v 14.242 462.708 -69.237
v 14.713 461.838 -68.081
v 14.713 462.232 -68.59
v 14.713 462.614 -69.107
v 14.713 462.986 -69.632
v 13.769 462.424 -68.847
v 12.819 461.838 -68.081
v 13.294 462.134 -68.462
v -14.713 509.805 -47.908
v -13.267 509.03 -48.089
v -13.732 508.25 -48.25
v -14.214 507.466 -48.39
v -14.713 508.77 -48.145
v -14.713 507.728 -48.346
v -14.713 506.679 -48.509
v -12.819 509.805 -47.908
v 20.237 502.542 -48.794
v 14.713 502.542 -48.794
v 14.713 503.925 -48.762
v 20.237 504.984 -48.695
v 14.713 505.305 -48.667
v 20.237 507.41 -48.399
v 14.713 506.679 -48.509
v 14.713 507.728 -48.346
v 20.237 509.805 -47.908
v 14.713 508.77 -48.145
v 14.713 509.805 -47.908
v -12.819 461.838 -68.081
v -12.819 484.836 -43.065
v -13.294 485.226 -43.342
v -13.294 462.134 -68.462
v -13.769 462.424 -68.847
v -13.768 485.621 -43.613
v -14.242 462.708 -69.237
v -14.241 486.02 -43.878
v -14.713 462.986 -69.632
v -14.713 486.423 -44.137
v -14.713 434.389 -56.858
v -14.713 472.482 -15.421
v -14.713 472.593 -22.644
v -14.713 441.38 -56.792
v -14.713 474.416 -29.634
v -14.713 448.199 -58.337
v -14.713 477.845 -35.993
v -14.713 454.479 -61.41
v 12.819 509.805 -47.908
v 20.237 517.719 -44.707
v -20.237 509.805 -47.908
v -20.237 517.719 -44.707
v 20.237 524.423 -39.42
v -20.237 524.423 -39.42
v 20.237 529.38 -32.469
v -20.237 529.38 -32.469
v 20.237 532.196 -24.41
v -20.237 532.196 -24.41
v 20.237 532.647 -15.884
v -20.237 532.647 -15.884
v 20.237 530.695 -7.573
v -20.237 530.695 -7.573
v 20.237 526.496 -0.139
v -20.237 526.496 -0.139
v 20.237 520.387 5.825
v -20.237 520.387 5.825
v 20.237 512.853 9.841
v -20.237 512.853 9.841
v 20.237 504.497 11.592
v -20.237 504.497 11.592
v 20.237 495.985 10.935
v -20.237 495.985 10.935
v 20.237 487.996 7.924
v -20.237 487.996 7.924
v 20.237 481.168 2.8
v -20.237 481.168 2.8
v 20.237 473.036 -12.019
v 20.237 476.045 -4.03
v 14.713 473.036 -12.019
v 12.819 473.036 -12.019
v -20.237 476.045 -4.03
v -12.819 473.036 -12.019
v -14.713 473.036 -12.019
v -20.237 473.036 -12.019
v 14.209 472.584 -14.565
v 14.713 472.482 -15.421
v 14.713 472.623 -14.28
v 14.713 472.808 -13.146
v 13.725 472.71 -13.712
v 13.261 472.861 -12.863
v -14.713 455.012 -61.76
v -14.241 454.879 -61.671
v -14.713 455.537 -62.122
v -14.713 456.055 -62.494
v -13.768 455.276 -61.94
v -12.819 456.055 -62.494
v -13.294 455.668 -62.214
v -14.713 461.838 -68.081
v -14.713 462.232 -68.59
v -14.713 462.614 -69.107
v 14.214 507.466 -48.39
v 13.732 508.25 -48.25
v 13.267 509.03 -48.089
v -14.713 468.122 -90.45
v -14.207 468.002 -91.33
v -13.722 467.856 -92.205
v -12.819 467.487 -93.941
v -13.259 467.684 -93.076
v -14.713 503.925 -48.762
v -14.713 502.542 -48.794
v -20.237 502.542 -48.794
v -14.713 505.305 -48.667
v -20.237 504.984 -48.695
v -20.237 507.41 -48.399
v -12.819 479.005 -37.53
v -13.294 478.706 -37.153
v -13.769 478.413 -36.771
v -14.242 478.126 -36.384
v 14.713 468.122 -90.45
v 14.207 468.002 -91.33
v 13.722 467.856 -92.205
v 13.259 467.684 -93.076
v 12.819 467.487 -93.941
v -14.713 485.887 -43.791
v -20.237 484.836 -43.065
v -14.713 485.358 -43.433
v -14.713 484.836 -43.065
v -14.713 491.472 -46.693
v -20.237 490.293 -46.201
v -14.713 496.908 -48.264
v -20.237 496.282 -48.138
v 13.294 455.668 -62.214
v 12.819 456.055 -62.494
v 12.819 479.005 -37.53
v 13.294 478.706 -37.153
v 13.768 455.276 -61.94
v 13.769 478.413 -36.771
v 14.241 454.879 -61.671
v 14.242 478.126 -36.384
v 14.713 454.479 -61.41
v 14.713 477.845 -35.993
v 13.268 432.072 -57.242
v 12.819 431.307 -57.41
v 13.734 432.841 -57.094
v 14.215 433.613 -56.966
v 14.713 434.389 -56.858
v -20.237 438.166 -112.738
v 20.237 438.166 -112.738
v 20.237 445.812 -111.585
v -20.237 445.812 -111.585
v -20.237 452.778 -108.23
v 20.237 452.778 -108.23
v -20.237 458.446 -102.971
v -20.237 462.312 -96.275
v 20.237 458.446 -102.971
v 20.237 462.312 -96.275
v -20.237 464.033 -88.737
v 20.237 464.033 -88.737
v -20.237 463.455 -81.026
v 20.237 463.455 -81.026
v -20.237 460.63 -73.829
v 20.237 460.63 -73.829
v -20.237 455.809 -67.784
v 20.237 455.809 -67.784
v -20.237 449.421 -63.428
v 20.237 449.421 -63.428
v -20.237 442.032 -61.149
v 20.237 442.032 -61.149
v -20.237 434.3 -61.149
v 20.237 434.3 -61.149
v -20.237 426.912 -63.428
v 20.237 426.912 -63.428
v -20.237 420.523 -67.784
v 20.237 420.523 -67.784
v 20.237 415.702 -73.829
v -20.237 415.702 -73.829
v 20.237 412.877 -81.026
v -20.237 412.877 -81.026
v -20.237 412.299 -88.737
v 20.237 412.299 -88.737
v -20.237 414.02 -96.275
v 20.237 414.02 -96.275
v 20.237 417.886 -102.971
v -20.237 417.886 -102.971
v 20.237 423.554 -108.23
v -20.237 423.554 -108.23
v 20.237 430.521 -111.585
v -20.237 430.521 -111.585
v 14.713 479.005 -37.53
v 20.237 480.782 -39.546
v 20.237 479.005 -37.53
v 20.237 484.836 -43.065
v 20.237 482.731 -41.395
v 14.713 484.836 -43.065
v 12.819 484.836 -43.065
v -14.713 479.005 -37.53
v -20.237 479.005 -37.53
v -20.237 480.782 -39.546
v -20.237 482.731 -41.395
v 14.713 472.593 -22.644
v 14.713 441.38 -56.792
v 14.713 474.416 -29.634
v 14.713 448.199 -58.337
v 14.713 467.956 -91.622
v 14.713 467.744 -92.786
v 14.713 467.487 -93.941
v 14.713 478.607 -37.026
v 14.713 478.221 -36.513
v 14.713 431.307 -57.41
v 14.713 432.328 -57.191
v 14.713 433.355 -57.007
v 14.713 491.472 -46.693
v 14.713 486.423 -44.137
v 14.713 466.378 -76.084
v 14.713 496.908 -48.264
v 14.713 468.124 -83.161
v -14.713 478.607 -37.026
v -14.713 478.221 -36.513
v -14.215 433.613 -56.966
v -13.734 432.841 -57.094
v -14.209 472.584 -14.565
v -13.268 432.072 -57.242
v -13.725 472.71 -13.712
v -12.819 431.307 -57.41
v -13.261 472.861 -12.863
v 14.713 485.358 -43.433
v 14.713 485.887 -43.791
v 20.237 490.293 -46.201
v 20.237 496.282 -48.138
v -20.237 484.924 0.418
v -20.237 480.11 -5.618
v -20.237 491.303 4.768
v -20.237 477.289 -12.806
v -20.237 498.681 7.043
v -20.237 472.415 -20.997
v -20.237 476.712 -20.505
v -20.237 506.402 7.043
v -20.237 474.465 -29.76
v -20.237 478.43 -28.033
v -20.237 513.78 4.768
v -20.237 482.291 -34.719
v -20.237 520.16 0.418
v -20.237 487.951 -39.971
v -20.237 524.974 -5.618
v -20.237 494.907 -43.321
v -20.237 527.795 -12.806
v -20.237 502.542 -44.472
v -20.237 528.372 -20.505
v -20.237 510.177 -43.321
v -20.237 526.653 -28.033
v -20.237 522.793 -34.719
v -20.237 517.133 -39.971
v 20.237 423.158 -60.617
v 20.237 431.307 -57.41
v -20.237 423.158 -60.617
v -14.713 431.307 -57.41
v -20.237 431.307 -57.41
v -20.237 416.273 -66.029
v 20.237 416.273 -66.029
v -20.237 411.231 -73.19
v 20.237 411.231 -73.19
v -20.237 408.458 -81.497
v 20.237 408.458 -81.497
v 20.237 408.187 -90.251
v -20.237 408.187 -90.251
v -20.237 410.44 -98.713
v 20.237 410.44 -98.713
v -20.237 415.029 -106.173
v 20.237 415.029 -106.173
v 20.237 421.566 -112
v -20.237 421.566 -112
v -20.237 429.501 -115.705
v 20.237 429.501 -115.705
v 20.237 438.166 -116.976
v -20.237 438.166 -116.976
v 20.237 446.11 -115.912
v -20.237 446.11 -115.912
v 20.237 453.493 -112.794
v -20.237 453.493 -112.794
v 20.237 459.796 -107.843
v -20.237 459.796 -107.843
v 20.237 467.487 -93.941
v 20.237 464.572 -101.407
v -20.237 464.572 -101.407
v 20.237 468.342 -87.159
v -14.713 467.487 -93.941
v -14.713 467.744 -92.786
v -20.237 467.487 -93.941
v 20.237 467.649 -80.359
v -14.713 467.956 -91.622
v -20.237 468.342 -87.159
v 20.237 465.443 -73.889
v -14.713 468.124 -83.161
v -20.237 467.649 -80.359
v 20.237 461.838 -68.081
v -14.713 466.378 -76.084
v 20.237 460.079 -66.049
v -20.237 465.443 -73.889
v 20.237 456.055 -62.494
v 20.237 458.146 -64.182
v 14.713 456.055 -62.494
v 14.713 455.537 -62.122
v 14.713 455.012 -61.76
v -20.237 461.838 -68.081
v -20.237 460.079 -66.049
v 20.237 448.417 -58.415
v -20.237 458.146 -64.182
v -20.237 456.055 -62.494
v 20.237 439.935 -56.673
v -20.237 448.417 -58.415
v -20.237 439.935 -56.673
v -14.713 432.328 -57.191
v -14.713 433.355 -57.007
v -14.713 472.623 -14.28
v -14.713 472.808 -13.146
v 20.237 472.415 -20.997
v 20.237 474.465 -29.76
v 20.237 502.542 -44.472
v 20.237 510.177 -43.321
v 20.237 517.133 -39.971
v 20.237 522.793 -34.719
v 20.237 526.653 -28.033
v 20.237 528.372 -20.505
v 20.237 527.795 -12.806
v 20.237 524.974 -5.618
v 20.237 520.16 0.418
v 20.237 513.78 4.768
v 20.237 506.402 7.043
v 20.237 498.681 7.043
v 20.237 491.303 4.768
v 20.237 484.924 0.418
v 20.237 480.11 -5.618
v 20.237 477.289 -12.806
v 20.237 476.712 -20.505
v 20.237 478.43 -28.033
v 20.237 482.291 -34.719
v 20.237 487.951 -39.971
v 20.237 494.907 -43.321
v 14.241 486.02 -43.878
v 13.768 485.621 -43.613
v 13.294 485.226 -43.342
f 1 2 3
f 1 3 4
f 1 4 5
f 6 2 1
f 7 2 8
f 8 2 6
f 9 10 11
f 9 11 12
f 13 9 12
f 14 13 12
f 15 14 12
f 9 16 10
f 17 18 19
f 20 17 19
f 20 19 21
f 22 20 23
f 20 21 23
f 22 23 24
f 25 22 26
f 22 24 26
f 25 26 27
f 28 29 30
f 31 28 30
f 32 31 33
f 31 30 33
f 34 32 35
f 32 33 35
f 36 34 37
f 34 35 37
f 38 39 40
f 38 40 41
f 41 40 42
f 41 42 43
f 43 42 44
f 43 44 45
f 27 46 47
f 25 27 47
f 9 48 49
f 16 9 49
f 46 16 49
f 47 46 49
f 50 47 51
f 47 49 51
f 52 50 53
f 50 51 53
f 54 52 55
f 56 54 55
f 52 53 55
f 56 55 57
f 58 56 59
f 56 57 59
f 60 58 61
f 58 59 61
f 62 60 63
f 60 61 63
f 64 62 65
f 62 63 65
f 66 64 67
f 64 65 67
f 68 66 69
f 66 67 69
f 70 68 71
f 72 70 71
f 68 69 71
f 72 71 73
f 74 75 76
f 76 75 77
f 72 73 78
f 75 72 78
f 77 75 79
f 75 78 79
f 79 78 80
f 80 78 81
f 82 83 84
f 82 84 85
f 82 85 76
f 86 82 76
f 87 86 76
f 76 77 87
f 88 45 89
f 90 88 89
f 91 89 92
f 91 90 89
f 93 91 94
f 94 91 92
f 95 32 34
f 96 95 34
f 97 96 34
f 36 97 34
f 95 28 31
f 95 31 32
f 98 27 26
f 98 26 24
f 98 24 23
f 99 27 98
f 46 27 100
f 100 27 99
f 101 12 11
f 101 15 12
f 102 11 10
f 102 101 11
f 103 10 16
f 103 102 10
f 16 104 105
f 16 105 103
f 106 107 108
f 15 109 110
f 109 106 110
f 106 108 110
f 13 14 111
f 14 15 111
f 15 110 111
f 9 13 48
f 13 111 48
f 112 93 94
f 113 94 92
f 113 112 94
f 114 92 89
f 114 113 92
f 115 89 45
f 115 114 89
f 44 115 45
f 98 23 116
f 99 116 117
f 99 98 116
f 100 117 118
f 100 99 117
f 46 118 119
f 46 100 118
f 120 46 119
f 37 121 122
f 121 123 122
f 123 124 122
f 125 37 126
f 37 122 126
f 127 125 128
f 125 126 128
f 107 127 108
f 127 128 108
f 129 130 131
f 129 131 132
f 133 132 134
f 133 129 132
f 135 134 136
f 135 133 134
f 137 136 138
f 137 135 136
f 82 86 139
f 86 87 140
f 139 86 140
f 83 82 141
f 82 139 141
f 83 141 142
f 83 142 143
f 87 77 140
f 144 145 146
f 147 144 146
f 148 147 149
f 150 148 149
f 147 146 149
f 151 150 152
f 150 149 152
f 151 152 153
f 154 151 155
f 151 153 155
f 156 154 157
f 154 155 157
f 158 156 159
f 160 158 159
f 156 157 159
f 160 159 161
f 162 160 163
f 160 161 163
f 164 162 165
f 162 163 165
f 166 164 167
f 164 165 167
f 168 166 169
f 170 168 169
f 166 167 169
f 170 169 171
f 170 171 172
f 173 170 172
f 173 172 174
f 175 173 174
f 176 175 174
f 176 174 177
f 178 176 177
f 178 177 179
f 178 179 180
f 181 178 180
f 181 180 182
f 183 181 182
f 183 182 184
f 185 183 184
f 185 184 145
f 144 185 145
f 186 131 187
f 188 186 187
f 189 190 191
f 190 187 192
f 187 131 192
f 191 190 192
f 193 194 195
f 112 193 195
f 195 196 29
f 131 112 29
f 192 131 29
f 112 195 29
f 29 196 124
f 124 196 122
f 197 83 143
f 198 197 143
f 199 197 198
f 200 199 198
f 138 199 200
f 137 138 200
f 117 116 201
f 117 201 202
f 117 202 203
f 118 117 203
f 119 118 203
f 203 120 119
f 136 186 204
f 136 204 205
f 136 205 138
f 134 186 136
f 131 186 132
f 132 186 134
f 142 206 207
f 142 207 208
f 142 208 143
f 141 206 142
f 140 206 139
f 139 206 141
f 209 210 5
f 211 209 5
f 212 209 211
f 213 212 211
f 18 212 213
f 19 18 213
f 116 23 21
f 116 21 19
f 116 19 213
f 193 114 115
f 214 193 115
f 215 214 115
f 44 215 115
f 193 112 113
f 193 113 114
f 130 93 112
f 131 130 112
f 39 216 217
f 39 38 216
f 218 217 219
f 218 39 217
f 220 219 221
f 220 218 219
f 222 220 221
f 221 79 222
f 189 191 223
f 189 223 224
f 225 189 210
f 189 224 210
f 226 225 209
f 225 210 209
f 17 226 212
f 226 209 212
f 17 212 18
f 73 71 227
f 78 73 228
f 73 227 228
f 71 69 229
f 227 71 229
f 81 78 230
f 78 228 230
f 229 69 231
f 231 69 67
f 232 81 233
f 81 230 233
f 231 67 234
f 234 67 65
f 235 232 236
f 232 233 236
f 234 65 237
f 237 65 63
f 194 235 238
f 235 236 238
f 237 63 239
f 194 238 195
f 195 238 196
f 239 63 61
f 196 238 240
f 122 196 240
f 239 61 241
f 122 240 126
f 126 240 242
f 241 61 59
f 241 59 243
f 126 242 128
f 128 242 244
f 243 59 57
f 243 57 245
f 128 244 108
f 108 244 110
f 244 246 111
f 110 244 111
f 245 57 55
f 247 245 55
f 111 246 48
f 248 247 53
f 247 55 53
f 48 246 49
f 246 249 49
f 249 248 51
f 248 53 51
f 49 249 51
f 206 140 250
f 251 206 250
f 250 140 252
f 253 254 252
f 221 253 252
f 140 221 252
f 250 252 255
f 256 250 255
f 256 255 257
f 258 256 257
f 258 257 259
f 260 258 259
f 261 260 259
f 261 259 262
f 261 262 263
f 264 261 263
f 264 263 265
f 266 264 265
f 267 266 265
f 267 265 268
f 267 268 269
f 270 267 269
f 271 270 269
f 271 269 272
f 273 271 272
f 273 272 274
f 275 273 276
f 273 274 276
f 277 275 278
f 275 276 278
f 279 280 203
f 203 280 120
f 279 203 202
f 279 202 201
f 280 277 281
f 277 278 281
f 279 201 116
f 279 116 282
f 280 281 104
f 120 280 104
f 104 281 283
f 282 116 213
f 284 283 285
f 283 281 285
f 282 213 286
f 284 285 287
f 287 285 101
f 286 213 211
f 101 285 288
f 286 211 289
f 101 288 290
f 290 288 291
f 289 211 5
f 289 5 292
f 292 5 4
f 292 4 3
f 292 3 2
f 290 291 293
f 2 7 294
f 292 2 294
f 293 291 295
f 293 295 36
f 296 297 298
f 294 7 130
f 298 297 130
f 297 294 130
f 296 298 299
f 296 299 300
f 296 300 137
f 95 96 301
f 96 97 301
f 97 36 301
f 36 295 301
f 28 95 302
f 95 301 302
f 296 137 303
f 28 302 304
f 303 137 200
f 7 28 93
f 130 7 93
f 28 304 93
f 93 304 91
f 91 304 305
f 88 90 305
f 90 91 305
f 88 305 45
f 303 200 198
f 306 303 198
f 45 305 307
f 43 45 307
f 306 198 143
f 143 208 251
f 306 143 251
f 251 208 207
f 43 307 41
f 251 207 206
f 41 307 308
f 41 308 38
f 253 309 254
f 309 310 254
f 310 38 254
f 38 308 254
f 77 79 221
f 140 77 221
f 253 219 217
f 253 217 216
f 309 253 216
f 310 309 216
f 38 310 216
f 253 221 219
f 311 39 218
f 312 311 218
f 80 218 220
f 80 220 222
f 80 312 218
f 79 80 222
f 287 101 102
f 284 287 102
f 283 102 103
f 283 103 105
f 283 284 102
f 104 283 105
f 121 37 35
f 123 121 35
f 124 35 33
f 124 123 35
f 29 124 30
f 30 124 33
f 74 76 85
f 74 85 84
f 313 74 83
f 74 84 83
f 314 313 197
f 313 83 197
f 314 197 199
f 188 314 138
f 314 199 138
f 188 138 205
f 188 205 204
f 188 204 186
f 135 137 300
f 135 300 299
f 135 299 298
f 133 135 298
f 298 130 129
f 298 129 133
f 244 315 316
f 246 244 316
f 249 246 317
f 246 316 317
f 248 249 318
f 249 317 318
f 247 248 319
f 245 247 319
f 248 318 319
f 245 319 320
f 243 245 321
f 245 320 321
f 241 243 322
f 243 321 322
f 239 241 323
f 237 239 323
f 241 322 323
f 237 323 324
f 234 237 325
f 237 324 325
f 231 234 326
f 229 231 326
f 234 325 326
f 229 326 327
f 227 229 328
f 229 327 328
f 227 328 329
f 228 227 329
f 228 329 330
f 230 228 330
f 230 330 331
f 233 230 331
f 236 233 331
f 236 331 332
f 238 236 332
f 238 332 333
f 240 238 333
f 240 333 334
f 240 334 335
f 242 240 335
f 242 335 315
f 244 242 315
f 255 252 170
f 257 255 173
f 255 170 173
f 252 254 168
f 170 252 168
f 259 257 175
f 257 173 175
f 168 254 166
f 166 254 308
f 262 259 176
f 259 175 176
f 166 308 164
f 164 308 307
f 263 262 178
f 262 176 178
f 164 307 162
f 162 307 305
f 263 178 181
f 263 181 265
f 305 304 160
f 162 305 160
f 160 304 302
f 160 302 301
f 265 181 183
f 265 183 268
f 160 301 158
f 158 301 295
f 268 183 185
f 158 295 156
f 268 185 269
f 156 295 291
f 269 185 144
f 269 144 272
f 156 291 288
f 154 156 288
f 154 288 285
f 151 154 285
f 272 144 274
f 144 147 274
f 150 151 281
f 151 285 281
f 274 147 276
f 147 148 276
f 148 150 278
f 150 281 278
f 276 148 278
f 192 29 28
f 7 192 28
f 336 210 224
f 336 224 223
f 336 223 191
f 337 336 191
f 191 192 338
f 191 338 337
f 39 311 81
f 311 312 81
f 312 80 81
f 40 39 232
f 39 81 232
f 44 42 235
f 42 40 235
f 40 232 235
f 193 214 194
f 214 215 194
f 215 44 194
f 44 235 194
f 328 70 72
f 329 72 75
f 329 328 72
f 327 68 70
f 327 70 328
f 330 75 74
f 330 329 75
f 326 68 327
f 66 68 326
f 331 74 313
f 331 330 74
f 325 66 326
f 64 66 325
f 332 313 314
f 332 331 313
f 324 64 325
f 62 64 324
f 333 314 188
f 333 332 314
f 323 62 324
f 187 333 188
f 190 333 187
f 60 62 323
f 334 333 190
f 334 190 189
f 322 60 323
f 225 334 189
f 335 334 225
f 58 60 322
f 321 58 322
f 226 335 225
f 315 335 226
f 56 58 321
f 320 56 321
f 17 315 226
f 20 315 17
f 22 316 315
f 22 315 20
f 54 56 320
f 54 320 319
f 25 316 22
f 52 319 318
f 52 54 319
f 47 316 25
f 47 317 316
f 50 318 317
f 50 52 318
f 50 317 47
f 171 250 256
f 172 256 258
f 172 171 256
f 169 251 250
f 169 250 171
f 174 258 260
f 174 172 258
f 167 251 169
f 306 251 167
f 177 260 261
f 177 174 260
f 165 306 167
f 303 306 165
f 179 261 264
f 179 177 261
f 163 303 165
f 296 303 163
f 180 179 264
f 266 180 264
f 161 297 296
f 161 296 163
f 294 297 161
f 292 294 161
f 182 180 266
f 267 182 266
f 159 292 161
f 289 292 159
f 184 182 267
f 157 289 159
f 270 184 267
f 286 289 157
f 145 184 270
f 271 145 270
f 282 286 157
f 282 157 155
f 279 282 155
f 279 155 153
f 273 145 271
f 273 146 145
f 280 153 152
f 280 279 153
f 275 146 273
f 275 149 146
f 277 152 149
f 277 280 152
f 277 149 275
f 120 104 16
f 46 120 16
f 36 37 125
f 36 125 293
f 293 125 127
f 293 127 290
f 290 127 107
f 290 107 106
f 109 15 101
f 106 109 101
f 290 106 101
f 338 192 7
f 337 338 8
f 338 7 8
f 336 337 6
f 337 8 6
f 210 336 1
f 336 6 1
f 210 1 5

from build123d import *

# Parameters (mm, degrees)
BOSS_EXTRUDE2_DEPTH      = 14.713204
BOSS_EXTRUDE2_DEPTH_BACK = 14.713204
BOSS_EXTRUDE3_DEPTH      = 20.236561
BOSS_EXTRUDE3_DEPTH_BACK = 20.236561
SKETCH2_R                = 25.902158
SKETCH2_R_2              = 25.939329669
CUT_EXTRUDE1_DEPTH       = 547.956280292
CHAMFER1_SIZE            = 1.894586


with BuildPart() as part:
    # Sketch1 → Boss-Extrude2 (new, two sides: drawn at the far end of the back side and taken through both)
    with BuildSketch(Plane(origin=(0, 0, 0), x_dir=(0, 0, -1), z_dir=(1, 0, 0)).offset(-BOSS_EXTRUDE2_DEPTH_BACK)):
        with BuildLine():
            ThreePointArc((37.530301218, 479.004762545), (25.455145516, 473.112329842), (12.01921241, 473.035844862))
            Line((12.01921241, 473.035844862), (57.410437724, 431.307373701))
            ThreePointArc((57.410437724, 431.307373701), (57.237962601, 444.238910489), (62.494422204, 456.05517148))
            Line((62.494422204, 456.05517148), (37.530301218, 479.004762545))
        make_face()
        with BuildLine():
            Line((93.941121838, 467.486529022), (47.908047204, 509.804855969))
            ThreePointArc((47.908047204, 509.804855969), (48.571470239, 506.200224369), (48.793700581, 502.541794))
            ThreePointArc((48.793700581, 502.541794), (47.325762011, 493.23696216), (43.064536592, 484.835968341))
            Line((43.064536592, 484.835968341), (68.081105171, 461.838170852))
            ThreePointArc((68.081105171, 461.838170852), (80.358782988, 467.648930733), (93.941121838, 467.486529022))
        make_face()
        with BuildLine():
            Line((0.348742, 483.76459), (12.01921241, 473.035844862))
            ThreePointArc((12.01921241, 473.035844862), (25.455145516, 473.112329842), (37.530301218, 479.004762545))
            Line((37.530301218, 479.004762545), (15.677896, 499.093744))
            Line((15.677896, 499.093744), (0.348742, 483.76459))
        make_face()
        with BuildLine():
            Line((47.908047204, 509.804855969), (36.696142, 520.11199))
            Line((36.696142, 520.11199), (21.366988, 504.782582))
            Line((21.366988, 504.782582), (43.064536592, 484.835968341))
            ThreePointArc((43.064536592, 484.835968341), (47.325762011, 493.23696216), (48.793700581, 502.541794))
            ThreePointArc((48.793700581, 502.541794), (48.571470239, 506.200224369), (47.908047204, 509.804855969))
        make_face()
        with BuildLine():
            Line((21.366988, 504.782582), (36.696142, 520.11199))
            Line((36.696142, 520.11199), (47.908047204, 509.804855969))
            ThreePointArc((47.908047204, 509.804855969), (-3.059663869, 523.653132734), (12.01921241, 473.035844862))
            Line((12.01921241, 473.035844862), (0.348742, 483.76459))
            Line((0.348742, 483.76459), (15.677896, 499.093744))
            Line((15.677896, 499.093744), (37.530301218, 479.004762545))
            ThreePointArc((37.530301218, 479.004762545), (40.492163472, 481.735538786), (43.064536592, 484.835968341))
            Line((43.064536592, 484.835968341), (21.366988, 504.782582))
        make_face()
        with BuildLine():
            ThreePointArc((116.976157863, 438.166256), (110.528637975, 456.809561064), (93.941121838, 467.486529022))
            Line((93.941121838, 467.486529022), (94.929198, 466.578188))
            Line((94.929198, 466.578188), (79.600044, 451.24878))
            Line((79.600044, 451.24878), (68.081105171, 461.838170852))
            ThreePointArc((68.081105171, 461.838170852), (65.094293396, 459.13357369), (62.494422204, 456.05517148))
            Line((62.494422204, 456.05517148), (73.911206, 445.559688))
            Line((73.911206, 445.559688), (58.581798, 430.230534))
            Line((58.581798, 430.230534), (57.410437724, 431.307373701))
            ThreePointArc((57.410437724, 431.307373701), (90.250505926, 408.186599222), (116.976157863, 438.166256))
        make_face()
        with BuildLine():
            Line((94.929198, 466.578188), (93.941121838, 467.486529022))
            ThreePointArc((93.941121838, 467.486529022), (80.358782988, 467.648930733), (68.081105171, 461.838170852))
            Line((68.081105171, 461.838170852), (79.600044, 451.24878))
            Line((79.600044, 451.24878), (94.929198, 466.578188))
        make_face()
        with BuildLine():
            ThreePointArc((62.494422204, 456.05517148), (57.237962601, 444.238910489), (57.410437724, 431.307373701))
            Line((57.410437724, 431.307373701), (58.581798, 430.230534))
            Line((58.581798, 430.230534), (73.911206, 445.559688))
            Line((73.911206, 445.559688), (62.494422204, 456.05517148))
        make_face()
    extrude(amount=BOSS_EXTRUDE2_DEPTH + BOSS_EXTRUDE2_DEPTH_BACK)

    # Sketch1<3> → Boss-Extrude3 (add, two sides: drawn at the far end of the back side and taken through both)
    with BuildSketch(Plane(origin=(0, 0, 0), x_dir=(0, 0, -1), z_dir=(1, 0, 0)).offset(-BOSS_EXTRUDE3_DEPTH_BACK)):
        with BuildLine():
            Line((21.366988, 504.782582), (36.696142, 520.11199))
            Line((36.696142, 520.11199), (47.908047204, 509.804855969))
            ThreePointArc((47.908047204, 509.804855969), (-3.059663869, 523.653132734), (12.01921241, 473.035844862))
            Line((12.01921241, 473.035844862), (0.348742, 483.76459))
            Line((0.348742, 483.76459), (15.677896, 499.093744))
            Line((15.677896, 499.093744), (37.530301218, 479.004762545))
            ThreePointArc((37.530301218, 479.004762545), (40.492163472, 481.735538786), (43.064536592, 484.835968341))
            Line((43.064536592, 484.835968341), (21.366988, 504.782582))
        make_face()
        with BuildLine():
            ThreePointArc((116.976157863, 438.166256), (110.528637975, 456.809561064), (93.941121838, 467.486529022))
            Line((93.941121838, 467.486529022), (94.929198, 466.578188))
            Line((94.929198, 466.578188), (79.600044, 451.24878))
            Line((79.600044, 451.24878), (68.081105171, 461.838170852))
            ThreePointArc((68.081105171, 461.838170852), (65.094293396, 459.13357369), (62.494422204, 456.05517148))
            Line((62.494422204, 456.05517148), (73.911206, 445.559688))
            Line((73.911206, 445.559688), (58.581798, 430.230534))
            Line((58.581798, 430.230534), (57.410437724, 431.307373701))
            ThreePointArc((57.410437724, 431.307373701), (90.250505926, 408.186599222), (116.976157863, 438.166256))
        make_face()
        with BuildLine():
            ThreePointArc((62.494422204, 456.05517148), (57.237962601, 444.238910489), (57.410437724, 431.307373701))
            Line((57.410437724, 431.307373701), (58.581798, 430.230534))
            Line((58.581798, 430.230534), (73.911206, 445.559688))
            Line((73.911206, 445.559688), (62.494422204, 456.05517148))
        make_face()
        with BuildLine():
            Line((94.929198, 466.578188), (93.941121838, 467.486529022))
            ThreePointArc((93.941121838, 467.486529022), (80.358782988, 467.648930733), (68.081105171, 461.838170852))
            Line((68.081105171, 461.838170852), (79.600044, 451.24878))
            Line((79.600044, 451.24878), (94.929198, 466.578188))
        make_face()
        with BuildLine():
            Line((47.908047204, 509.804855969), (36.696142, 520.11199))
            Line((36.696142, 520.11199), (21.366988, 504.782582))
            Line((21.366988, 504.782582), (43.064536592, 484.835968341))
            ThreePointArc((43.064536592, 484.835968341), (47.325762011, 493.23696216), (48.793700581, 502.541794))
            ThreePointArc((48.793700581, 502.541794), (48.571470239, 506.200224369), (47.908047204, 509.804855969))
        make_face()
        with BuildLine():
            Line((0.348742, 483.76459), (12.01921241, 473.035844862))
            ThreePointArc((12.01921241, 473.035844862), (25.455145516, 473.112329842), (37.530301218, 479.004762545))
            Line((37.530301218, 479.004762545), (15.677896, 499.093744))
            Line((15.677896, 499.093744), (0.348742, 483.76459))
        make_face()
    extrude(amount=BOSS_EXTRUDE3_DEPTH + BOSS_EXTRUDE3_DEPTH_BACK)

    # Sketch2 → Cut-Extrude1 (cut, through all)
    with BuildSketch(Plane(origin=(20.236561, 0, 0), x_dir=(0, 0, -1), z_dir=(1, 0, 0))):
        with Locations((18.569432, 502.541794)):
            Circle(SKETCH2_R)
        with Locations((86.798404, 438.166256)):
            Circle(SKETCH2_R_2)
    extrude(amount=-CUT_EXTRUDE1_DEPTH, mode=Mode.SUBTRACT)

    # Chamfer1
    # the kernel refuses this chamfer: 1.894586 mm, written as the material it takes off along each edge
    with BuildSketch(Plane(origin=(-14.713204, 482.302213593, -33.943397788), x_dir=(0.9996219169112971, 0.0202420968703396, -0.018608620176565335), z_dir=(0, -0.6767785744793956, -0.7361866347100016))) as chamfer1_piece_1_section:
        Polygon((CHAMFER1_SIZE * 0.999621916911, CHAMFER1_SIZE * 0.0274958766106), (-CHAMFER1_SIZE * 0.0274958766106, CHAMFER1_SIZE * 0.999621916911), (0, 0), align=None)
    chamfer1_piece_1 = extrude(amount=43.654592913, mode=Mode.PRIVATE)
    chamfer1_piece_1 = chamfer1_piece_1 - Plane(origin=(-14.082586432, 438.166256, -86.798404), x_dir=(0, 0.7844160622334895, 0.6202349887825632), z_dir=(-1, 0, 0)) * Cylinder(30.177753863, 95, mode=Mode.PRIVATE)
    chamfer1_piece_1 = chamfer1_piece_1 - Plane(origin=(-14.082586432, 502.541794, -18.569432), x_dir=(0, -0.7787461057189721, -0.6273392246843295), z_dir=(-1, 0, 0)) * Cylinder(30.224268581, 95, mode=Mode.PRIVATE)
    add(chamfer1_piece_1, mode=Mode.SUBTRACT)
    with BuildSketch(Plane(origin=(14.713204, 513.102306333, -44.321143144), x_dir=(0.027495876610586445, -0.7359084240497759, 0.6765225555604119), z_dir=(0, -0.6767784340411219, -0.7361867638153017))) as chamfer1_piece_2_section:
        Polygon((CHAMFER1_SIZE * 0.999621916911, CHAMFER1_SIZE * 0.0274958766106), (-CHAMFER1_SIZE * 0.0274958766106, CHAMFER1_SIZE * 0.999621916911), (0, 0), align=None)
    chamfer1_piece_2 = extrude(amount=72.273620457, mode=Mode.PRIVATE)
    chamfer1_piece_2 = chamfer1_piece_2 - Plane(origin=(14.076738279, 438.166256, -86.798404), x_dir=(0, 0.7844160622334895, 0.6202349887825632), z_dir=(-1, 0, 0)) * Cylinder(30.177753863, 153, mode=Mode.PRIVATE)
    chamfer1_piece_2 = chamfer1_piece_2 - Plane(origin=(14.076738279, 502.541794, -18.569432), x_dir=(0, -0.7787461057189721, -0.6273392246843295), z_dir=(-1, 0, 0)) * Cylinder(30.224268581, 153, mode=Mode.PRIVATE)
    add(chamfer1_piece_2, mode=Mode.SUBTRACT)
    with BuildSketch(Plane(origin=(14.713204, 458.540720488, -71.668009231), x_dir=(-0.9996219169112969, -0.02024210042020755, 0.018608616315095913), z_dir=(0, 0.6767784340411188, 0.7361867638153047))) as chamfer1_piece_3_section:
        Polygon((CHAMFER1_SIZE * 0.999621916911, -CHAMFER1_SIZE * 0.0274958766106), (-CHAMFER1_SIZE * 0.0274958766106, -CHAMFER1_SIZE * 0.999621916911), (0, 0), align=None)
    chamfer1_piece_3 = extrude(amount=43.725829206, mode=Mode.PRIVATE)
    chamfer1_piece_3 = chamfer1_piece_3 - Plane(origin=(14.082637489, 438.166256, -86.798404), x_dir=(0, 0.7844160622334895, 0.6202349887825632), z_dir=(-1, 0, 0)) * Cylinder(30.177753863, 96, mode=Mode.PRIVATE)
    chamfer1_piece_3 = chamfer1_piece_3 - Plane(origin=(14.082637489, 502.541794, -18.569432), x_dir=(0, -0.7787461057189721, -0.6273392246843295), z_dir=(-1, 0, 0)) * Cylinder(30.224268581, 96, mode=Mode.PRIVATE)
    add(chamfer1_piece_3, mode=Mode.SUBTRACT)
    with BuildSketch(Plane(origin=(14.713204, 452.757720432, -66.081325634), x_dir=(-0.9996219169112969, 0.02024209687034323, -0.01860862017656867), z_dir=(0, 0.6767785744793956, 0.7361866347100016))) as chamfer1_piece_4_section:
        Polygon((CHAMFER1_SIZE * 0.999621916911, CHAMFER1_SIZE * 0.0274958766106), (-CHAMFER1_SIZE * 0.0274958766106, CHAMFER1_SIZE * 0.999621916911), (0, 0), align=None)
    chamfer1_piece_4 = extrude(amount=43.654592913, mode=Mode.PRIVATE)
    chamfer1_piece_4 = chamfer1_piece_4 - Plane(origin=(14.082586432, 438.166256, -86.798404), x_dir=(0, 0.7844160622334895, 0.6202349887825632), z_dir=(-1, 0, 0)) * Cylinder(30.177753863, 95, mode=Mode.PRIVATE)
    chamfer1_piece_4 = chamfer1_piece_4 - Plane(origin=(14.082586432, 502.541794, -18.569432), x_dir=(0, -0.7787461057189721, -0.6273392246843295), z_dir=(-1, 0, 0)) * Cylinder(30.224268581, 95, mode=Mode.PRIVATE)
    add(chamfer1_piece_4, mode=Mode.SUBTRACT)
    with BuildSketch(Plane(origin=(-14.713204, 464.189078658, -97.528025897), x_dir=(-0.0274958766105856, -0.735908424049776, 0.6765225555604119), z_dir=(0, 0.6767784340411219, 0.7361867638153017))) as chamfer1_piece_5_section:
        Polygon((CHAMFER1_SIZE * 0.999621916911, CHAMFER1_SIZE * 0.0274958766106), (-CHAMFER1_SIZE * 0.0274958766106, CHAMFER1_SIZE * 0.999621916911), (0, 0), align=None)
    chamfer1_piece_5 = extrude(amount=72.273620457, mode=Mode.PRIVATE)
    chamfer1_piece_5 = chamfer1_piece_5 - Plane(origin=(-14.076738279, 438.166256, -86.798404), x_dir=(0, 0.7844160622334895, 0.6202349887825632), z_dir=(-1, 0, 0)) * Cylinder(30.177753863, 153, mode=Mode.PRIVATE)
    chamfer1_piece_5 = chamfer1_piece_5 - Plane(origin=(-14.076738279, 502.541794, -18.569432), x_dir=(0, -0.7787461057189721, -0.6273392246843295), z_dir=(-1, 0, 0)) * Cylinder(30.224268581, 153, mode=Mode.PRIVATE)
    add(chamfer1_piece_5, mode=Mode.SUBTRACT)
    with BuildSketch(Plane(origin=(14.713204, 428.009914857, -60.997333989), x_dir=(-0.9996219169112965, -0.0202420564302285, 0.01860866416646602), z_dir=(0, 0.6767801743515941, 0.7361851639394983))) as chamfer1_piece_6_section:
        Polygon((CHAMFER1_SIZE * 0.999621916911, -CHAMFER1_SIZE * 0.0274958766106), (-CHAMFER1_SIZE * 0.0274958766106, -CHAMFER1_SIZE * 0.999621916911), (0, 0), align=None)
    chamfer1_piece_6 = extrude(amount=71.401897808, mode=Mode.PRIVATE)
    chamfer1_piece_6 = chamfer1_piece_6 - Plane(origin=(14.076843775, 438.166256, -86.798404), x_dir=(0, 0.7844160622334895, 0.6202349887825632), z_dir=(-1, 0, 0)) * Cylinder(30.177753863, 151, mode=Mode.PRIVATE)
    chamfer1_piece_6 = chamfer1_piece_6 - Plane(origin=(14.076843775, 502.541794, -18.569432), x_dir=(0, -0.7787461057189721, -0.6273392246843295), z_dir=(-1, 0, 0)) * Cylinder(30.224268581, 151, mode=Mode.PRIVATE)
    add(chamfer1_piece_6, mode=Mode.SUBTRACT)
    with BuildSketch(Plane(origin=(-14.713204, 476.333303705, -8.432316145), x_dir=(-0.027495876610586514, 0.7359068247788585, -0.6765242952129021), z_dir=(0, -0.6767801743515941, -0.7361851639394983))) as chamfer1_piece_7_section:
        Polygon((CHAMFER1_SIZE * 0.999621916911, CHAMFER1_SIZE * 0.0274958766106), (-CHAMFER1_SIZE * 0.0274958766106, CHAMFER1_SIZE * 0.999621916911), (0, 0), align=None)
    chamfer1_piece_7 = extrude(amount=71.401897808, mode=Mode.PRIVATE)
    chamfer1_piece_7 = chamfer1_piece_7 - Plane(origin=(-14.076843775, 438.166256, -86.798404), x_dir=(0, 0.7844160622334895, 0.6202349887825632), z_dir=(-1, 0, 0)) * Cylinder(30.177753863, 151, mode=Mode.PRIVATE)
    chamfer1_piece_7 = chamfer1_piece_7 - Plane(origin=(-14.076843775, 502.541794, -18.569432), x_dir=(0, -0.7787461057189721, -0.6273392246843295), z_dir=(-1, 0, 0)) * Cylinder(30.224268581, 151, mode=Mode.PRIVATE)
    add(chamfer1_piece_7, mode=Mode.SUBTRACT)
    with BuildSketch(Plane(origin=(-14.713204, 488.133418705, -39.477632533), x_dir=(0.999621916911297, -0.020242100420206275, 0.01860861631509474), z_dir=(0, -0.6767784340411188, -0.7361867638153047))) as chamfer1_piece_8_section:
        Polygon((CHAMFER1_SIZE * 0.999621916911, -CHAMFER1_SIZE * 0.0274958766106), (-CHAMFER1_SIZE * 0.0274958766106, -CHAMFER1_SIZE * 0.999621916911), (0, 0), align=None)
    chamfer1_piece_8 = extrude(amount=43.725829206, mode=Mode.PRIVATE)
    chamfer1_piece_8 = chamfer1_piece_8 - Plane(origin=(-14.082637489, 438.166256, -86.798404), x_dir=(0, 0.7844160622334895, 0.6202349887825632), z_dir=(-1, 0, 0)) * Cylinder(30.177753863, 96, mode=Mode.PRIVATE)
    chamfer1_piece_8 = chamfer1_piece_8 - Plane(origin=(-14.082637489, 502.541794, -18.569432), x_dir=(0, -0.7787461057189721, -0.6273392246843295), z_dir=(-1, 0, 0)) * Cylinder(30.224268581, 96, mode=Mode.PRIVATE)
    add(chamfer1_piece_8, mode=Mode.SUBTRACT)


solid = part.part
